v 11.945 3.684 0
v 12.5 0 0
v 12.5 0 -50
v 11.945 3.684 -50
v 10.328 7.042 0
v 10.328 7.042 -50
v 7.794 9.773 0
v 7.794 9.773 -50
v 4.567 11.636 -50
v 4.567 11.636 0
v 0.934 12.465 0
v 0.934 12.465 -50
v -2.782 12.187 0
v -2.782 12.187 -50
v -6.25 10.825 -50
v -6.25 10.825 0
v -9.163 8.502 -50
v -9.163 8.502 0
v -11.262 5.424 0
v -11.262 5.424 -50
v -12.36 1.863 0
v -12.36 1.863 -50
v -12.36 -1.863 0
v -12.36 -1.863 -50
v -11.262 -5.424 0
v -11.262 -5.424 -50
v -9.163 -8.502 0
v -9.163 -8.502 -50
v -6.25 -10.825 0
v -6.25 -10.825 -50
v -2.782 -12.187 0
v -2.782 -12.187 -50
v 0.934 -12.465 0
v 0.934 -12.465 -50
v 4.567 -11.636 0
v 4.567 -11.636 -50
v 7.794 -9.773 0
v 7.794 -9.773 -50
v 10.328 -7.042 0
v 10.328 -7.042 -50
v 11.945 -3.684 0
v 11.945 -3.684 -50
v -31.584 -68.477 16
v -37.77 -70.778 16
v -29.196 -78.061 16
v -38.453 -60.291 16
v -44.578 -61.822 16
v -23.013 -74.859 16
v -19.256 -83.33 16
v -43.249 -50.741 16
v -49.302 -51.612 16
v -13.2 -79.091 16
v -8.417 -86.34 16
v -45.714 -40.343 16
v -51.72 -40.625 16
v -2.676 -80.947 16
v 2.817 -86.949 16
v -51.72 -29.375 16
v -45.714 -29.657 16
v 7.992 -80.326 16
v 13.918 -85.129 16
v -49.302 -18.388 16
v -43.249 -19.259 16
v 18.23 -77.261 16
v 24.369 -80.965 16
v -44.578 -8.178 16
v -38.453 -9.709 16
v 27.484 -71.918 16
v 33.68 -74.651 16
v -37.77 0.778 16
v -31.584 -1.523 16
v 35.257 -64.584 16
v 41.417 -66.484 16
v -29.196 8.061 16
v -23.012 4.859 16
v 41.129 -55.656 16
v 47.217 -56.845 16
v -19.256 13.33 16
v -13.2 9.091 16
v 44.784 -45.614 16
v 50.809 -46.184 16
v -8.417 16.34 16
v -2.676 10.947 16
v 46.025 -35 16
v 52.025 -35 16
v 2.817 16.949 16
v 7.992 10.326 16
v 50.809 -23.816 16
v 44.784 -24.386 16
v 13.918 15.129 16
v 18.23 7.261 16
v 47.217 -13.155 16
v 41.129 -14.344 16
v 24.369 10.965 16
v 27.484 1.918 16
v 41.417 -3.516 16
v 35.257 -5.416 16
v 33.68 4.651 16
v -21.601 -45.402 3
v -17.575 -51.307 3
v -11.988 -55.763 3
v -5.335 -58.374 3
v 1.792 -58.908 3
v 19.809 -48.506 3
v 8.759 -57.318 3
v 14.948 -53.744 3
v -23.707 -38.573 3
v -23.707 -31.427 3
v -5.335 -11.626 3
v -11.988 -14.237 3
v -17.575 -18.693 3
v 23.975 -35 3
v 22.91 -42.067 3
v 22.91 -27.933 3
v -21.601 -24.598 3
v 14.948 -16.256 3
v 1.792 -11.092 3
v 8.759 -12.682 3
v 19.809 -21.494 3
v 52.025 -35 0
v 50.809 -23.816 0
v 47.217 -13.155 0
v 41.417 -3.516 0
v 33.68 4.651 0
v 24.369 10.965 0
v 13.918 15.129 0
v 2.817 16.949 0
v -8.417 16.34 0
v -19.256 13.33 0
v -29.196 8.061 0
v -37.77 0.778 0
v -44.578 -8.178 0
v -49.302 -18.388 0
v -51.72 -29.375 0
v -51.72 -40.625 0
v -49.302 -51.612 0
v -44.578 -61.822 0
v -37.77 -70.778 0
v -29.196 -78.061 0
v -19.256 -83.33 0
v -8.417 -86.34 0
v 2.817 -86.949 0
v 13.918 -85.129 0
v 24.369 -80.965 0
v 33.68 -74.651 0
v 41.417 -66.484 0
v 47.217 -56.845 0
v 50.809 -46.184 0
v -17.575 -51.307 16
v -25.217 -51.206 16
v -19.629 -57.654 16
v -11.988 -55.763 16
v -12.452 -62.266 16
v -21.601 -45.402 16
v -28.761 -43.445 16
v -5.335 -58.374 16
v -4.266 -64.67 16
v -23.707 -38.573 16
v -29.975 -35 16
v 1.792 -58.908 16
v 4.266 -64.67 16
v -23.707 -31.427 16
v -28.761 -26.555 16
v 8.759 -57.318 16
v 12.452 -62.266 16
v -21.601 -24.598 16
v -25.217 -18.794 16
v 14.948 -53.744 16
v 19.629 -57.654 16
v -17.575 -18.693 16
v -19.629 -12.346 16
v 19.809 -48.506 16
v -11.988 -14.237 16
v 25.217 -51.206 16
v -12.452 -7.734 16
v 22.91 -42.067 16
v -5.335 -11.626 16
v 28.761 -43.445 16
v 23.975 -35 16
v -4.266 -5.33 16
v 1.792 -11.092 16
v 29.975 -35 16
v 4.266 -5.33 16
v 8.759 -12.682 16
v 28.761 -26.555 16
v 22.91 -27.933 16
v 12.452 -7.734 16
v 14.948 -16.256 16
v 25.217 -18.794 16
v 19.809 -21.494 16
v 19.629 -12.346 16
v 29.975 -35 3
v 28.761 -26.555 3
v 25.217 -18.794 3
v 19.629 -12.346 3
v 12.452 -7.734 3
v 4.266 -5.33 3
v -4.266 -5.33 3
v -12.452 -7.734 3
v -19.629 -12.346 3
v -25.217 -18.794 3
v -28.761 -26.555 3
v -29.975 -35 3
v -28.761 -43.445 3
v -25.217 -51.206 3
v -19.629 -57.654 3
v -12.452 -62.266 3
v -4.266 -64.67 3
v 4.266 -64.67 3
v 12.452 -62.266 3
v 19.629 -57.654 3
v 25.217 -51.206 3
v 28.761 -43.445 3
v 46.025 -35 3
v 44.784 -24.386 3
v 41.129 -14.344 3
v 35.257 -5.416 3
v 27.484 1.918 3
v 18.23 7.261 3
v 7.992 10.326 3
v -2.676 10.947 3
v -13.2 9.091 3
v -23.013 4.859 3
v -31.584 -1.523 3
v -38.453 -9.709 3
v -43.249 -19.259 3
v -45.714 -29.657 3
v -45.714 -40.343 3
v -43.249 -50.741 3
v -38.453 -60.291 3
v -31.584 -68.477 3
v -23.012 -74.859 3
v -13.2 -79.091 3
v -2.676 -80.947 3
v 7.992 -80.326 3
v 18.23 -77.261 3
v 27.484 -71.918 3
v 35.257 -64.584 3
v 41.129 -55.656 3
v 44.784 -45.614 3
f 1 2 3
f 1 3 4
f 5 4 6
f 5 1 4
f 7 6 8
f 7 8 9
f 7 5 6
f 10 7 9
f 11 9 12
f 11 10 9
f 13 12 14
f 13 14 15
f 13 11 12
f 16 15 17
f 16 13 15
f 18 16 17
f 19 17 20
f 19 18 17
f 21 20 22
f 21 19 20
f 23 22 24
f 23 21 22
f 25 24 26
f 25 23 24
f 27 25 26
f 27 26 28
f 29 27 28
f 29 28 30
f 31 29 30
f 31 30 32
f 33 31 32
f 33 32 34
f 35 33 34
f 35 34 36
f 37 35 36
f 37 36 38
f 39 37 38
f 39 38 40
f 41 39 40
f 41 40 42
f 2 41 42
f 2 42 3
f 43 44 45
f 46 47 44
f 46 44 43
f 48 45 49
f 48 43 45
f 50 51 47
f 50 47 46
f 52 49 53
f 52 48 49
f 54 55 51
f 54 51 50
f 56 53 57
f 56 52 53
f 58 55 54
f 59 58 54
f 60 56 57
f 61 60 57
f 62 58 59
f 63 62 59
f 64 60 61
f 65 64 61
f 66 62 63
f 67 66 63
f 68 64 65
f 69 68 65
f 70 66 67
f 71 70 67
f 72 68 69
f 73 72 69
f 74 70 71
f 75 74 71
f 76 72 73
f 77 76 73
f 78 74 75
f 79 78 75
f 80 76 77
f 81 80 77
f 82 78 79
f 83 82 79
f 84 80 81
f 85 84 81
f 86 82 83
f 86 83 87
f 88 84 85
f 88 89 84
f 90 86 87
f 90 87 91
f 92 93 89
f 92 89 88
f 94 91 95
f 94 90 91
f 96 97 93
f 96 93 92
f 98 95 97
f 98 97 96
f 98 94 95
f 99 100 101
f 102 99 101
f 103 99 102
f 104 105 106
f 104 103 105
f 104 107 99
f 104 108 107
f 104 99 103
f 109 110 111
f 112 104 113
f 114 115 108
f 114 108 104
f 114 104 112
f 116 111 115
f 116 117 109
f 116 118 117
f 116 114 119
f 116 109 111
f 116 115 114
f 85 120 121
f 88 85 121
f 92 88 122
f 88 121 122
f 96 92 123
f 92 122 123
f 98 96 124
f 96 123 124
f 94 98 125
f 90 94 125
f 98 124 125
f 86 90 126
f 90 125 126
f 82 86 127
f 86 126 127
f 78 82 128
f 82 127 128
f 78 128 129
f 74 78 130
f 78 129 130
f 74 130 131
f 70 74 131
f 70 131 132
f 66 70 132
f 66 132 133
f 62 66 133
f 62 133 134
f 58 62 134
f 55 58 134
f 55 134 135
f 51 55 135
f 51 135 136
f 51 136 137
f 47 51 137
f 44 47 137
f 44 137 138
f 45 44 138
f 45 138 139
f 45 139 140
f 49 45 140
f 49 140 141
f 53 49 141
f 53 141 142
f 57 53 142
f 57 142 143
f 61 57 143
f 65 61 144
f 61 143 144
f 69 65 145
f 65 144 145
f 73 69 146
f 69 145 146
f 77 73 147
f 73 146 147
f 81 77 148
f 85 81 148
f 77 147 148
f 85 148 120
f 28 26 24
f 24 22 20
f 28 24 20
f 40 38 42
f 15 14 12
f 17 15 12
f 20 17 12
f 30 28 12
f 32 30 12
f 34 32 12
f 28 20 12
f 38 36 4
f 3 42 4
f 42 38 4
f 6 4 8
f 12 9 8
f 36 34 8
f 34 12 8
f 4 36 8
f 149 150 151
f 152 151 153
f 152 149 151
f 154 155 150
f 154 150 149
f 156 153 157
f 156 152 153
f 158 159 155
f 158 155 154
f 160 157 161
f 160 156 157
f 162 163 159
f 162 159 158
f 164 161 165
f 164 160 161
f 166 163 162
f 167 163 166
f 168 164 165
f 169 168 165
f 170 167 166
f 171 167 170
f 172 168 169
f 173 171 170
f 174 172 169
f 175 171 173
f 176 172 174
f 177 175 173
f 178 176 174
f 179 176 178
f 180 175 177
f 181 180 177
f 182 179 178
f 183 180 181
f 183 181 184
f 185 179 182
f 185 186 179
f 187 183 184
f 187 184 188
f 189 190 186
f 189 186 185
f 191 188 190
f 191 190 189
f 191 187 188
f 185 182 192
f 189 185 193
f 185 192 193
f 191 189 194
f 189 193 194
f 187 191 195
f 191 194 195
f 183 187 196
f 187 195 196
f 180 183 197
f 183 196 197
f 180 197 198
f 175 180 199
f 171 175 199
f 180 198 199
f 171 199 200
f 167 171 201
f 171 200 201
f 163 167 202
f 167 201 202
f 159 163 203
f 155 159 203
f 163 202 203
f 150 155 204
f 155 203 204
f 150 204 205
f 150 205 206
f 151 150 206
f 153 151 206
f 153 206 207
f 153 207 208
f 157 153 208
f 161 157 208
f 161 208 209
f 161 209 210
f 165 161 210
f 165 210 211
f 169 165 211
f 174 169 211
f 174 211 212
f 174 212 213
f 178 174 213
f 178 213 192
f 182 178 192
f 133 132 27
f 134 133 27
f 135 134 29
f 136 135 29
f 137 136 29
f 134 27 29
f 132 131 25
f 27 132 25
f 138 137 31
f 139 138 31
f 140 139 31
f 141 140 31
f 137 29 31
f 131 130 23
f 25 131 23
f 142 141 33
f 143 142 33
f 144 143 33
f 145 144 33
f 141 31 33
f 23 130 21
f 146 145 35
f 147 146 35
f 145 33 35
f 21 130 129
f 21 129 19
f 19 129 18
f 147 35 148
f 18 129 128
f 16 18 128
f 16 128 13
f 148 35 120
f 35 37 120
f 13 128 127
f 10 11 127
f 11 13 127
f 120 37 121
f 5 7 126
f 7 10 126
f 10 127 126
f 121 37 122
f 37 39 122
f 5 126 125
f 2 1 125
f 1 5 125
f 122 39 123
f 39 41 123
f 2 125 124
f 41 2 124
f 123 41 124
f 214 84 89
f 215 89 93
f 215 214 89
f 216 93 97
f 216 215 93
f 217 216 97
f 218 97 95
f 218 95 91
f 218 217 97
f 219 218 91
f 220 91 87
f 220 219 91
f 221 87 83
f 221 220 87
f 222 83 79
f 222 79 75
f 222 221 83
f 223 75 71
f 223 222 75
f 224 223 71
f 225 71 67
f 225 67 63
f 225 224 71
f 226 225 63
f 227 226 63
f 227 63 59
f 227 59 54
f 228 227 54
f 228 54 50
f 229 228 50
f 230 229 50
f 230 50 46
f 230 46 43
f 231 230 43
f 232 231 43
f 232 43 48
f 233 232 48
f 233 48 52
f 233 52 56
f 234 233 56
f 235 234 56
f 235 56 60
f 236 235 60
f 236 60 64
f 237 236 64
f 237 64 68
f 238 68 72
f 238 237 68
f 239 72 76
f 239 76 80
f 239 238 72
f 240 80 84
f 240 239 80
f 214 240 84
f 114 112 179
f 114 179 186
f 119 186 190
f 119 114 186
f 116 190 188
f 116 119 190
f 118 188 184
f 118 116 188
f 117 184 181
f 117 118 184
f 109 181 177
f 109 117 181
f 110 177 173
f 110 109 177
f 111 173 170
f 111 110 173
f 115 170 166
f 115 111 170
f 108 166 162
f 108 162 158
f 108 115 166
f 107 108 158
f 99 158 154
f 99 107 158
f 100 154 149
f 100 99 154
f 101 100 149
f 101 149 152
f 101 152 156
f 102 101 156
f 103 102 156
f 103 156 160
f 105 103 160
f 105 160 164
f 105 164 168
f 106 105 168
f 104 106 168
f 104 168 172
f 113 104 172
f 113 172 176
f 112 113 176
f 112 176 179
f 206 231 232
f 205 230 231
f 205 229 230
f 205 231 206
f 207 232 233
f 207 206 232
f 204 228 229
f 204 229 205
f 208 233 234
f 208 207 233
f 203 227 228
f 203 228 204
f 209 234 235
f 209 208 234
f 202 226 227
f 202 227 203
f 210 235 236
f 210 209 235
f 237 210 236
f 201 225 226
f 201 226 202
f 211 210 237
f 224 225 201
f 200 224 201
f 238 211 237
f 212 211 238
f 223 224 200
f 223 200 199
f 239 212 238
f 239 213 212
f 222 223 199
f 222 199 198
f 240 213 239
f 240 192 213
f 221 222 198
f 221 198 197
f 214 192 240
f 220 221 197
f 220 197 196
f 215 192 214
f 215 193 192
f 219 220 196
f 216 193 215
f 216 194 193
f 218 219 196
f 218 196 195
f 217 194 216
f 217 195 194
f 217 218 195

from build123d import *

# Parameters (mm, degrees)
SKETCH1_R           = 12.5
BOSS_EXTRUDE1_DEPTH = 50
SKETCH2_R           = 52.025
SKETCH2_R_2         = 46.025
SKETCH2_R_3         = 29.975
SKETCH2_R_4         = 23.975
BOSS_EXTRUDE2_DEPTH = 16
SKETCH4_R           = 52.025
BOSS_EXTRUDE3_DEPTH = 3


with BuildPart() as part:
    # Sketch1 → Boss-Extrude1 (new body)
    with BuildSketch(Plane.XY):
        Circle(SKETCH1_R)
    extrude(amount=-BOSS_EXTRUDE1_DEPTH)

    # Sketch2 → Boss-Extrude2 (add)
    with BuildSketch(Plane.XY):
        with Locations((0, -35)):
            Circle(SKETCH2_R)
        with Locations((0, -35)):
            Circle(SKETCH2_R_2, mode=Mode.SUBTRACT)
        with Locations((0, -35)):
            Circle(SKETCH2_R_3)
        with Locations((0, -35)):
            Circle(SKETCH2_R_4, mode=Mode.SUBTRACT)
    extrude(amount=BOSS_EXTRUDE2_DEPTH)

    # Sketch4 → Boss-Extrude3 (add)
    with BuildSketch(Plane.XY):
        with Locations((0, -35)):
            Circle(SKETCH4_R)
    extrude(amount=BOSS_EXTRUDE3_DEPTH)


solid = part.part
